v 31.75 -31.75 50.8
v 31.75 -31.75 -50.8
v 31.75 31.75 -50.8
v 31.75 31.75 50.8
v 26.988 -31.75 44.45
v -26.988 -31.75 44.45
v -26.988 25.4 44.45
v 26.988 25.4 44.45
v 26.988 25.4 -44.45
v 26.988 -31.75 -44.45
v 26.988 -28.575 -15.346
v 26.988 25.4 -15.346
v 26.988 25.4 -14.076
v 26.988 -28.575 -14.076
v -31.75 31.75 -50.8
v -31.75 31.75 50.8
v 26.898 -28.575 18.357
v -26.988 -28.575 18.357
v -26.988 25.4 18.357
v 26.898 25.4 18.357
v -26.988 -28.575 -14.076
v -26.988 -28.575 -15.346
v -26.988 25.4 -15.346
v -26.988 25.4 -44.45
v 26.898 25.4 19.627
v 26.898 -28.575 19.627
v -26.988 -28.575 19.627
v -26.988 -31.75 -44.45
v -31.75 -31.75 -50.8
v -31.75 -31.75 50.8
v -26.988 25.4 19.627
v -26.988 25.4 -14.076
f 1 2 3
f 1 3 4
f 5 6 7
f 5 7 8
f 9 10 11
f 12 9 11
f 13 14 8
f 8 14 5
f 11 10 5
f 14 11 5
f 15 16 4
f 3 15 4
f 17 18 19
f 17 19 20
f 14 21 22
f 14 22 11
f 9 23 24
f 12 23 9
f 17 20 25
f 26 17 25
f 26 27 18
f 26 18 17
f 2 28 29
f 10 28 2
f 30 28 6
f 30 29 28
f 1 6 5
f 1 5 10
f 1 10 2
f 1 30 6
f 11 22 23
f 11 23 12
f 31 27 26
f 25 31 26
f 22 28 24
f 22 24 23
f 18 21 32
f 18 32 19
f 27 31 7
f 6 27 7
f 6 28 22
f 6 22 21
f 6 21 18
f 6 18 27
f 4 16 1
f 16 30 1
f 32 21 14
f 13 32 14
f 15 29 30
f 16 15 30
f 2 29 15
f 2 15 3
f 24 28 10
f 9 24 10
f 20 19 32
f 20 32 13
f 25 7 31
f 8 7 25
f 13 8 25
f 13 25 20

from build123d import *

# Parameters (mm, degrees)
F0_W     = 63.5
F0_H     = 101.6
F1_DEPTH = 31.75
F2_W     = 53.975
F2_H     = 88.9
F3_DEPTH = 57.15
F4_W     = 53.975
F4_H     = 1.27
F5_DEPTH = 28.575


with BuildPart() as f1:
    # F0 (on Front) → F1 (new body, symmetric)
    with BuildSketch(Plane.XZ):
        Rectangle(F0_W, F0_H)
    extrude(amount=F1_DEPTH, both=True)

    # F2 (on face) → F3 (cut)
    with BuildSketch(Plane.XZ.offset(31.75)):
        Rectangle(F2_W, F2_H)
    extrude(amount=-F3_DEPTH, mode=Mode.SUBTRACT)

    # F4 (on Front) → F5 (join, symmetric)
    with BuildSketch(Plane.XZ):
        with Locations((-0.089094, 18.991973)):
            Rectangle(F4_W, F4_H)
        with Locations((0, -14.710611)):
            Rectangle(F4_W, F4_H)
    extrude(amount=F5_DEPTH, both=True)


solid = f1.part
